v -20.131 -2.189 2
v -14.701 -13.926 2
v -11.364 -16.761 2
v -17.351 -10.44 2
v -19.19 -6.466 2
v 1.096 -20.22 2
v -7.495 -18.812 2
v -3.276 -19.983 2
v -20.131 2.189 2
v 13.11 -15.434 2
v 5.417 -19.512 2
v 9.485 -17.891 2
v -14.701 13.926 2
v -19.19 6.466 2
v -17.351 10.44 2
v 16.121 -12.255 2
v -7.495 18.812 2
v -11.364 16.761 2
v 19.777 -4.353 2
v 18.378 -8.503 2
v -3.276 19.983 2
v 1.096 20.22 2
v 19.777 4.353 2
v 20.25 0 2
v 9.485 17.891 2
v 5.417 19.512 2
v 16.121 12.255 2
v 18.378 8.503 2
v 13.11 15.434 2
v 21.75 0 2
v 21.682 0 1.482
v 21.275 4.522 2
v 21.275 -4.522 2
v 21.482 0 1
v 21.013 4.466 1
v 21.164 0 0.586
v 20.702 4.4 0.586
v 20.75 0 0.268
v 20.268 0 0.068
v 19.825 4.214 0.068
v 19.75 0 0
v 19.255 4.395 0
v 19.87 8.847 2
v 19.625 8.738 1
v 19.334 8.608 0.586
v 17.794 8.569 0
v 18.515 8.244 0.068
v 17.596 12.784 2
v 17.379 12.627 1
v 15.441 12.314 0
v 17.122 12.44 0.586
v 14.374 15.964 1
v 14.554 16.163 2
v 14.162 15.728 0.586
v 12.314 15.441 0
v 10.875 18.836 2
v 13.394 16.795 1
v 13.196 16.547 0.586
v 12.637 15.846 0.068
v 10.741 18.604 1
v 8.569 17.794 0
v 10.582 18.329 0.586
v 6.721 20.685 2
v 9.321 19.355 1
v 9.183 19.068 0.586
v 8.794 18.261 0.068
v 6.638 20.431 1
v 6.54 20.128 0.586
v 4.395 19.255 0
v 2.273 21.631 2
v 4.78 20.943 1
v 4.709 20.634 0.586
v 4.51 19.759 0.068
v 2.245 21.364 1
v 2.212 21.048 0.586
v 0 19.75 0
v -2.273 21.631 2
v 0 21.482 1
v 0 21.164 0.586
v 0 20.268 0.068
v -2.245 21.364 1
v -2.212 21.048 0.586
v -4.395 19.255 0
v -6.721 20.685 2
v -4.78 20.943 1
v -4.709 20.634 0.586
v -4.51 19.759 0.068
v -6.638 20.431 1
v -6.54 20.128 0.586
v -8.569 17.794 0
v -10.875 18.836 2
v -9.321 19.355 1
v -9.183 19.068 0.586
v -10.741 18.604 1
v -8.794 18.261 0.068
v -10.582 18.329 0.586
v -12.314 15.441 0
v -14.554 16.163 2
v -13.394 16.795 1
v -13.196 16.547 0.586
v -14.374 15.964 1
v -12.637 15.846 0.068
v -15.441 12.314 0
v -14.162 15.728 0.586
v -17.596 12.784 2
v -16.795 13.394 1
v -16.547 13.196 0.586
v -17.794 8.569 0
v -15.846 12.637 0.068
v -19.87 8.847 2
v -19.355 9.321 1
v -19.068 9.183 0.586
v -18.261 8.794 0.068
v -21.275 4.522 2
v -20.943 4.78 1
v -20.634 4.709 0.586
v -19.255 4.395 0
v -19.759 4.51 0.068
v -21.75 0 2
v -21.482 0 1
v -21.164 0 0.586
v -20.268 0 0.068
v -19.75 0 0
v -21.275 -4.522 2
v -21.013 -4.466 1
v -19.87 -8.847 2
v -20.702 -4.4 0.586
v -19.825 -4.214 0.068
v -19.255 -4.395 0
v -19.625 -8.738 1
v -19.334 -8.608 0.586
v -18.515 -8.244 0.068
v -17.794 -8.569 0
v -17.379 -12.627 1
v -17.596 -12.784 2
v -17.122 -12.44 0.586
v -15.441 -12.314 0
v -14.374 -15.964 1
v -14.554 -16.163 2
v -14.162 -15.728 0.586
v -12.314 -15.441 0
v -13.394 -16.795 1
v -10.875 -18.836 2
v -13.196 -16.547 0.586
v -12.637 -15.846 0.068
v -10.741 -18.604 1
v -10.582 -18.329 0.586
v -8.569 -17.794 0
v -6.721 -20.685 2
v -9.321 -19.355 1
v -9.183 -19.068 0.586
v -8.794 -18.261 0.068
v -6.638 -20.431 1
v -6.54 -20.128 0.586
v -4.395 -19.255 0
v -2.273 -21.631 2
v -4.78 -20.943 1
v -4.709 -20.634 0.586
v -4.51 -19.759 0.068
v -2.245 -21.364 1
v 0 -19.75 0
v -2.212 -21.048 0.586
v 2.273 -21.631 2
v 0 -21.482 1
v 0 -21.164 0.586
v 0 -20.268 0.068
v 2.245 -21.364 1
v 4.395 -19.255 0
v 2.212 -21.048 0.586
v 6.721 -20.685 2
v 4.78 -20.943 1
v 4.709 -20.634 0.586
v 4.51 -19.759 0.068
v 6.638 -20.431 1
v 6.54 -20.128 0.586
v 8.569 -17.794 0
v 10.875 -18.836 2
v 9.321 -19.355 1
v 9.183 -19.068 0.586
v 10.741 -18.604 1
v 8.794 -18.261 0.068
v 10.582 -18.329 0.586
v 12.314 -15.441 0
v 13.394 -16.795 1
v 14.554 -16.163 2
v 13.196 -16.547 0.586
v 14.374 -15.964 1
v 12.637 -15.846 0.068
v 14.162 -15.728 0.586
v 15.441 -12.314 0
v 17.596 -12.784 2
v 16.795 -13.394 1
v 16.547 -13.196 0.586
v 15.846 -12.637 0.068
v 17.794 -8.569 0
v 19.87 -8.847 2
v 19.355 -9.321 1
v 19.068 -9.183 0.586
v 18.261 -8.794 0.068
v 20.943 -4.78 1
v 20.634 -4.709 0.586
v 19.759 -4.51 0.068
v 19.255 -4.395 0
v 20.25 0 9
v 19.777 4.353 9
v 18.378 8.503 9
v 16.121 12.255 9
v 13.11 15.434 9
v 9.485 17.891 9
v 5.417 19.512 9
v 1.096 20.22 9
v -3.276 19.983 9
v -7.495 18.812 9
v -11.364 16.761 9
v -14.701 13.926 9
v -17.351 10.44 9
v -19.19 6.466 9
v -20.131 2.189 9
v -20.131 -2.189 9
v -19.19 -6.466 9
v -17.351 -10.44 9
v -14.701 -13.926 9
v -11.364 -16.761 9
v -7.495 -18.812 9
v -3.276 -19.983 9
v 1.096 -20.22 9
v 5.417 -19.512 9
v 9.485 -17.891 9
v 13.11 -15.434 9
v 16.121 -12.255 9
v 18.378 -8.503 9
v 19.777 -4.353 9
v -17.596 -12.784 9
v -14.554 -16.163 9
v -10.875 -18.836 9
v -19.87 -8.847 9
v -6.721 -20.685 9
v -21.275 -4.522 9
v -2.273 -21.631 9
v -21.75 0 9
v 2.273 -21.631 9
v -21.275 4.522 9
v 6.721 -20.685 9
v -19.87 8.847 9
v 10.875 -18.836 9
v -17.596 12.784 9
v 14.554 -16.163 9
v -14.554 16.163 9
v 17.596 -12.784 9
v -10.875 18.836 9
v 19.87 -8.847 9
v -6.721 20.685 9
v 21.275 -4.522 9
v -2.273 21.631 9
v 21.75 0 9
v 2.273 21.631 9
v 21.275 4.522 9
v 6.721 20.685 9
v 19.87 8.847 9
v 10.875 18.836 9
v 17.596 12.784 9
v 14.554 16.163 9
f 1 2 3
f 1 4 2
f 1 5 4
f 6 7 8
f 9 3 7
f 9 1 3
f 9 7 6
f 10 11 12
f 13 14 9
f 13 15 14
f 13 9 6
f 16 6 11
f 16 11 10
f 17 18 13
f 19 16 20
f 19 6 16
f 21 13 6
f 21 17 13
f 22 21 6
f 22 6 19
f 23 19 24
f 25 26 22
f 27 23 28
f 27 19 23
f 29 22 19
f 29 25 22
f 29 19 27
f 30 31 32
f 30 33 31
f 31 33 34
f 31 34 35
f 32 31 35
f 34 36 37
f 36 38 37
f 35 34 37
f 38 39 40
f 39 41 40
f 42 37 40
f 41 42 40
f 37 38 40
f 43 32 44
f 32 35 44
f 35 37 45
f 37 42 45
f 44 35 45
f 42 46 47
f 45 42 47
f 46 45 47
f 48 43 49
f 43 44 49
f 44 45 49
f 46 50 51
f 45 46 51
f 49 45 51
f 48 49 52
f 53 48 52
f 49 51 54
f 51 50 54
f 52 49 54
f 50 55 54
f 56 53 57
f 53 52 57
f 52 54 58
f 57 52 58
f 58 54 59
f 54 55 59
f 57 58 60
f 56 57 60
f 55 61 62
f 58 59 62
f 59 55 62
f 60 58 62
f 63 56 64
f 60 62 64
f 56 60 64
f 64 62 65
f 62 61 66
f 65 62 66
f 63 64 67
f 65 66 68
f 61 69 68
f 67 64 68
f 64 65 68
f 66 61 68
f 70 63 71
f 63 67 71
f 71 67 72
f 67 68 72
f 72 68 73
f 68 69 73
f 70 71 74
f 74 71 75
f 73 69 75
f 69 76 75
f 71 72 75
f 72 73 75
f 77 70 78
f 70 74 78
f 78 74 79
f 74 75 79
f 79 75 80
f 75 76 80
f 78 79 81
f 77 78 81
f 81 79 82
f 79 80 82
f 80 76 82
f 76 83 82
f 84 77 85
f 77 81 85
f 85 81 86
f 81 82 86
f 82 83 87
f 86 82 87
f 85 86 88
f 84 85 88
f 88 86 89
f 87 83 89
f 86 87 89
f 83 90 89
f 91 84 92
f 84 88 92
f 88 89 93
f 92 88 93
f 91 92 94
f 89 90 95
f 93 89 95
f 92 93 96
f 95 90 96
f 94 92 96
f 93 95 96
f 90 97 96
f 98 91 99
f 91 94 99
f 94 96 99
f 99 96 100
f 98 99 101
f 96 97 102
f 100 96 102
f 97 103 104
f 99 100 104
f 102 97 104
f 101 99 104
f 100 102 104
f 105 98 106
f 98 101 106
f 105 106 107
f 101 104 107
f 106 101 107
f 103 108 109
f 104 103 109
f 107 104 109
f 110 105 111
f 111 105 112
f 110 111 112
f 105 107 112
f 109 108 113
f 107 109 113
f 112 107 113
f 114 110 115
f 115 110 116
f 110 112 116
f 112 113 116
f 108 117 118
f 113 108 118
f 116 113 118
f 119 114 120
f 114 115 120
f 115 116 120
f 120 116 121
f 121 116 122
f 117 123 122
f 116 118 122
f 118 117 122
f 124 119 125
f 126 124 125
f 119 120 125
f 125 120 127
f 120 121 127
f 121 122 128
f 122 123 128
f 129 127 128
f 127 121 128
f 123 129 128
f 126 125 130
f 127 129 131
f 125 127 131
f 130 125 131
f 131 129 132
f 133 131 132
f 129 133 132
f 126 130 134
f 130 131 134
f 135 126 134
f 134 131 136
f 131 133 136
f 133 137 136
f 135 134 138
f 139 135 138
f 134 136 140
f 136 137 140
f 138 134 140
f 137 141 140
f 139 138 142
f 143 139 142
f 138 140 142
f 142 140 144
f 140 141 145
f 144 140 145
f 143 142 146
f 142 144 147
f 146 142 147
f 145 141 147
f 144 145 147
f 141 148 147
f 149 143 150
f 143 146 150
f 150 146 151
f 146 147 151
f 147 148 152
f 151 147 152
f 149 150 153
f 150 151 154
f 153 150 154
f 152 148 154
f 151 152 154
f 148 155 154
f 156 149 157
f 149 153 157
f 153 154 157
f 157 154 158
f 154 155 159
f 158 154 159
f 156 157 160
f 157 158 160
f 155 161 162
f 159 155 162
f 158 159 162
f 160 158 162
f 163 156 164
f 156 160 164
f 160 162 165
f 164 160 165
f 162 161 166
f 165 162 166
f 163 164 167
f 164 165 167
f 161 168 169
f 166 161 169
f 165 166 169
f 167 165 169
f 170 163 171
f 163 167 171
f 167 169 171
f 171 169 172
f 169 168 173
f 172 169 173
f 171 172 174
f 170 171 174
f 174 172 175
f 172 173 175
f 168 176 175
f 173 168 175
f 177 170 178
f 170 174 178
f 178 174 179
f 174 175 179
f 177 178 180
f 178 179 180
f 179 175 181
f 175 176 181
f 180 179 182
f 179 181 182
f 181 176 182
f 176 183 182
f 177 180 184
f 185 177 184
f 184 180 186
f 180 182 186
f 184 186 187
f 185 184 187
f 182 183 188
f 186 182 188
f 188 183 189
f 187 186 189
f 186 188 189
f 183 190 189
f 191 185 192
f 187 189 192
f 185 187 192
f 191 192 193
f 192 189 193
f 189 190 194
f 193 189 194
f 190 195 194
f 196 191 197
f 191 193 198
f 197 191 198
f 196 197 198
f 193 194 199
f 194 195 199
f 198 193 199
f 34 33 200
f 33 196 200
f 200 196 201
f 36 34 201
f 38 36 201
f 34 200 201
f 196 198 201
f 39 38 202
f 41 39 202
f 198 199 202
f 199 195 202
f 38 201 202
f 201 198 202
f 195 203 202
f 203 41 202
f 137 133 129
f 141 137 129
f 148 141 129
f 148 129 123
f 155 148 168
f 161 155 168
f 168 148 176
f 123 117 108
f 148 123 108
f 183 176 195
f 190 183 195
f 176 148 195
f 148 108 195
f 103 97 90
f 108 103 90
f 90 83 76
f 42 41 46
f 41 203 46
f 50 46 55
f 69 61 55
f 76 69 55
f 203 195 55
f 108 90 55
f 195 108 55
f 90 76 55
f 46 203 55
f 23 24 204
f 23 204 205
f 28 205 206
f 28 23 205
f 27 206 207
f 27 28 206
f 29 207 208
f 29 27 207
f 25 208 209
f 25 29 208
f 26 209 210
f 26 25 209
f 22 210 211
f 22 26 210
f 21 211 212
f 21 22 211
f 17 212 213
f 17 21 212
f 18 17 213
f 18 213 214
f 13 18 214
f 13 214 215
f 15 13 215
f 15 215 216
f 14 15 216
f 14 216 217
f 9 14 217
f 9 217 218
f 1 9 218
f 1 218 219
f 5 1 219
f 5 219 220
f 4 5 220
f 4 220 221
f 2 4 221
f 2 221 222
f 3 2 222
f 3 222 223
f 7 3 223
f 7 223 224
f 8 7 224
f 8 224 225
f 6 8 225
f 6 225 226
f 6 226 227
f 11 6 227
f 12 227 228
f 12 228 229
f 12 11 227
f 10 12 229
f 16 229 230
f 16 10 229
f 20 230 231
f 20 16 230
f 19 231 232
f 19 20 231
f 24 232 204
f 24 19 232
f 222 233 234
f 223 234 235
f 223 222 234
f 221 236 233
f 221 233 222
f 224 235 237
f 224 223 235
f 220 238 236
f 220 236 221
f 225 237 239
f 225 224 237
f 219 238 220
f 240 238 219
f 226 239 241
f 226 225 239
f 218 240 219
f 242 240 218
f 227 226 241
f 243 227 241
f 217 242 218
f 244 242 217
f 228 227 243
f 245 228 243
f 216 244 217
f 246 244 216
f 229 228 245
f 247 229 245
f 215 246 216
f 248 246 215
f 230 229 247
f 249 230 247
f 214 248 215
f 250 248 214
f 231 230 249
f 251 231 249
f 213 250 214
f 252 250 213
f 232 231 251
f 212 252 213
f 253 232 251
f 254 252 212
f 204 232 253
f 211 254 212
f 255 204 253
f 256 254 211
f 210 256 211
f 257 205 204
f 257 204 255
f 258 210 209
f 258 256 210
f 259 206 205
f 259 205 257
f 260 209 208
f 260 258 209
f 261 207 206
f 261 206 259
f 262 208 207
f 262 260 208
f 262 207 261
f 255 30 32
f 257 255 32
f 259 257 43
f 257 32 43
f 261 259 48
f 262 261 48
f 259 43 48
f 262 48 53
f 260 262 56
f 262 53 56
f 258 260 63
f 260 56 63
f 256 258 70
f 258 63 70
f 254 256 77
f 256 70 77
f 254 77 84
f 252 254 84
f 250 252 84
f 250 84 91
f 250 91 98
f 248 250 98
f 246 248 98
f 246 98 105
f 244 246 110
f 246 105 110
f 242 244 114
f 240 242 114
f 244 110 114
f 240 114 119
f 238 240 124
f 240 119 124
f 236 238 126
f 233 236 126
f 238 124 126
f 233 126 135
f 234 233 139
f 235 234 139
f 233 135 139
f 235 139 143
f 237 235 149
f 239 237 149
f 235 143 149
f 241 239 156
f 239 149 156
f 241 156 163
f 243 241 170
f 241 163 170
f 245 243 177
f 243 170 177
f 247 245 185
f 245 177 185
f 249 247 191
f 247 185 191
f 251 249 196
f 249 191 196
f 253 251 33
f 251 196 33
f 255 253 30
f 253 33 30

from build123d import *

# Parameters (mm, degrees)
F0_R     = 21.75
F1_DEPTH = 2
F2_R     = 21.75
F2_R_2   = 20.25
F3_DEPTH = 9
F4_R     = 2


with BuildPart() as f1:
    # F0 (on Top) → F1 (new body)
    with BuildSketch(Plane.XY):
        Circle(F0_R)
    extrude(amount=F1_DEPTH)

    # F2 (on Top) → F3 (join)
    with BuildSketch(Plane.XY):
        Circle(F2_R)
        Circle(F2_R_2, mode=Mode.SUBTRACT)
    extrude(amount=F3_DEPTH)

    # F4
    f4_edges = [f1.edges().sort_by_distance(p)[0] for p in [
        (-21.75, 0, 0),
    ]]
    fillet(f4_edges, radius=F4_R)


solid = f1.part
